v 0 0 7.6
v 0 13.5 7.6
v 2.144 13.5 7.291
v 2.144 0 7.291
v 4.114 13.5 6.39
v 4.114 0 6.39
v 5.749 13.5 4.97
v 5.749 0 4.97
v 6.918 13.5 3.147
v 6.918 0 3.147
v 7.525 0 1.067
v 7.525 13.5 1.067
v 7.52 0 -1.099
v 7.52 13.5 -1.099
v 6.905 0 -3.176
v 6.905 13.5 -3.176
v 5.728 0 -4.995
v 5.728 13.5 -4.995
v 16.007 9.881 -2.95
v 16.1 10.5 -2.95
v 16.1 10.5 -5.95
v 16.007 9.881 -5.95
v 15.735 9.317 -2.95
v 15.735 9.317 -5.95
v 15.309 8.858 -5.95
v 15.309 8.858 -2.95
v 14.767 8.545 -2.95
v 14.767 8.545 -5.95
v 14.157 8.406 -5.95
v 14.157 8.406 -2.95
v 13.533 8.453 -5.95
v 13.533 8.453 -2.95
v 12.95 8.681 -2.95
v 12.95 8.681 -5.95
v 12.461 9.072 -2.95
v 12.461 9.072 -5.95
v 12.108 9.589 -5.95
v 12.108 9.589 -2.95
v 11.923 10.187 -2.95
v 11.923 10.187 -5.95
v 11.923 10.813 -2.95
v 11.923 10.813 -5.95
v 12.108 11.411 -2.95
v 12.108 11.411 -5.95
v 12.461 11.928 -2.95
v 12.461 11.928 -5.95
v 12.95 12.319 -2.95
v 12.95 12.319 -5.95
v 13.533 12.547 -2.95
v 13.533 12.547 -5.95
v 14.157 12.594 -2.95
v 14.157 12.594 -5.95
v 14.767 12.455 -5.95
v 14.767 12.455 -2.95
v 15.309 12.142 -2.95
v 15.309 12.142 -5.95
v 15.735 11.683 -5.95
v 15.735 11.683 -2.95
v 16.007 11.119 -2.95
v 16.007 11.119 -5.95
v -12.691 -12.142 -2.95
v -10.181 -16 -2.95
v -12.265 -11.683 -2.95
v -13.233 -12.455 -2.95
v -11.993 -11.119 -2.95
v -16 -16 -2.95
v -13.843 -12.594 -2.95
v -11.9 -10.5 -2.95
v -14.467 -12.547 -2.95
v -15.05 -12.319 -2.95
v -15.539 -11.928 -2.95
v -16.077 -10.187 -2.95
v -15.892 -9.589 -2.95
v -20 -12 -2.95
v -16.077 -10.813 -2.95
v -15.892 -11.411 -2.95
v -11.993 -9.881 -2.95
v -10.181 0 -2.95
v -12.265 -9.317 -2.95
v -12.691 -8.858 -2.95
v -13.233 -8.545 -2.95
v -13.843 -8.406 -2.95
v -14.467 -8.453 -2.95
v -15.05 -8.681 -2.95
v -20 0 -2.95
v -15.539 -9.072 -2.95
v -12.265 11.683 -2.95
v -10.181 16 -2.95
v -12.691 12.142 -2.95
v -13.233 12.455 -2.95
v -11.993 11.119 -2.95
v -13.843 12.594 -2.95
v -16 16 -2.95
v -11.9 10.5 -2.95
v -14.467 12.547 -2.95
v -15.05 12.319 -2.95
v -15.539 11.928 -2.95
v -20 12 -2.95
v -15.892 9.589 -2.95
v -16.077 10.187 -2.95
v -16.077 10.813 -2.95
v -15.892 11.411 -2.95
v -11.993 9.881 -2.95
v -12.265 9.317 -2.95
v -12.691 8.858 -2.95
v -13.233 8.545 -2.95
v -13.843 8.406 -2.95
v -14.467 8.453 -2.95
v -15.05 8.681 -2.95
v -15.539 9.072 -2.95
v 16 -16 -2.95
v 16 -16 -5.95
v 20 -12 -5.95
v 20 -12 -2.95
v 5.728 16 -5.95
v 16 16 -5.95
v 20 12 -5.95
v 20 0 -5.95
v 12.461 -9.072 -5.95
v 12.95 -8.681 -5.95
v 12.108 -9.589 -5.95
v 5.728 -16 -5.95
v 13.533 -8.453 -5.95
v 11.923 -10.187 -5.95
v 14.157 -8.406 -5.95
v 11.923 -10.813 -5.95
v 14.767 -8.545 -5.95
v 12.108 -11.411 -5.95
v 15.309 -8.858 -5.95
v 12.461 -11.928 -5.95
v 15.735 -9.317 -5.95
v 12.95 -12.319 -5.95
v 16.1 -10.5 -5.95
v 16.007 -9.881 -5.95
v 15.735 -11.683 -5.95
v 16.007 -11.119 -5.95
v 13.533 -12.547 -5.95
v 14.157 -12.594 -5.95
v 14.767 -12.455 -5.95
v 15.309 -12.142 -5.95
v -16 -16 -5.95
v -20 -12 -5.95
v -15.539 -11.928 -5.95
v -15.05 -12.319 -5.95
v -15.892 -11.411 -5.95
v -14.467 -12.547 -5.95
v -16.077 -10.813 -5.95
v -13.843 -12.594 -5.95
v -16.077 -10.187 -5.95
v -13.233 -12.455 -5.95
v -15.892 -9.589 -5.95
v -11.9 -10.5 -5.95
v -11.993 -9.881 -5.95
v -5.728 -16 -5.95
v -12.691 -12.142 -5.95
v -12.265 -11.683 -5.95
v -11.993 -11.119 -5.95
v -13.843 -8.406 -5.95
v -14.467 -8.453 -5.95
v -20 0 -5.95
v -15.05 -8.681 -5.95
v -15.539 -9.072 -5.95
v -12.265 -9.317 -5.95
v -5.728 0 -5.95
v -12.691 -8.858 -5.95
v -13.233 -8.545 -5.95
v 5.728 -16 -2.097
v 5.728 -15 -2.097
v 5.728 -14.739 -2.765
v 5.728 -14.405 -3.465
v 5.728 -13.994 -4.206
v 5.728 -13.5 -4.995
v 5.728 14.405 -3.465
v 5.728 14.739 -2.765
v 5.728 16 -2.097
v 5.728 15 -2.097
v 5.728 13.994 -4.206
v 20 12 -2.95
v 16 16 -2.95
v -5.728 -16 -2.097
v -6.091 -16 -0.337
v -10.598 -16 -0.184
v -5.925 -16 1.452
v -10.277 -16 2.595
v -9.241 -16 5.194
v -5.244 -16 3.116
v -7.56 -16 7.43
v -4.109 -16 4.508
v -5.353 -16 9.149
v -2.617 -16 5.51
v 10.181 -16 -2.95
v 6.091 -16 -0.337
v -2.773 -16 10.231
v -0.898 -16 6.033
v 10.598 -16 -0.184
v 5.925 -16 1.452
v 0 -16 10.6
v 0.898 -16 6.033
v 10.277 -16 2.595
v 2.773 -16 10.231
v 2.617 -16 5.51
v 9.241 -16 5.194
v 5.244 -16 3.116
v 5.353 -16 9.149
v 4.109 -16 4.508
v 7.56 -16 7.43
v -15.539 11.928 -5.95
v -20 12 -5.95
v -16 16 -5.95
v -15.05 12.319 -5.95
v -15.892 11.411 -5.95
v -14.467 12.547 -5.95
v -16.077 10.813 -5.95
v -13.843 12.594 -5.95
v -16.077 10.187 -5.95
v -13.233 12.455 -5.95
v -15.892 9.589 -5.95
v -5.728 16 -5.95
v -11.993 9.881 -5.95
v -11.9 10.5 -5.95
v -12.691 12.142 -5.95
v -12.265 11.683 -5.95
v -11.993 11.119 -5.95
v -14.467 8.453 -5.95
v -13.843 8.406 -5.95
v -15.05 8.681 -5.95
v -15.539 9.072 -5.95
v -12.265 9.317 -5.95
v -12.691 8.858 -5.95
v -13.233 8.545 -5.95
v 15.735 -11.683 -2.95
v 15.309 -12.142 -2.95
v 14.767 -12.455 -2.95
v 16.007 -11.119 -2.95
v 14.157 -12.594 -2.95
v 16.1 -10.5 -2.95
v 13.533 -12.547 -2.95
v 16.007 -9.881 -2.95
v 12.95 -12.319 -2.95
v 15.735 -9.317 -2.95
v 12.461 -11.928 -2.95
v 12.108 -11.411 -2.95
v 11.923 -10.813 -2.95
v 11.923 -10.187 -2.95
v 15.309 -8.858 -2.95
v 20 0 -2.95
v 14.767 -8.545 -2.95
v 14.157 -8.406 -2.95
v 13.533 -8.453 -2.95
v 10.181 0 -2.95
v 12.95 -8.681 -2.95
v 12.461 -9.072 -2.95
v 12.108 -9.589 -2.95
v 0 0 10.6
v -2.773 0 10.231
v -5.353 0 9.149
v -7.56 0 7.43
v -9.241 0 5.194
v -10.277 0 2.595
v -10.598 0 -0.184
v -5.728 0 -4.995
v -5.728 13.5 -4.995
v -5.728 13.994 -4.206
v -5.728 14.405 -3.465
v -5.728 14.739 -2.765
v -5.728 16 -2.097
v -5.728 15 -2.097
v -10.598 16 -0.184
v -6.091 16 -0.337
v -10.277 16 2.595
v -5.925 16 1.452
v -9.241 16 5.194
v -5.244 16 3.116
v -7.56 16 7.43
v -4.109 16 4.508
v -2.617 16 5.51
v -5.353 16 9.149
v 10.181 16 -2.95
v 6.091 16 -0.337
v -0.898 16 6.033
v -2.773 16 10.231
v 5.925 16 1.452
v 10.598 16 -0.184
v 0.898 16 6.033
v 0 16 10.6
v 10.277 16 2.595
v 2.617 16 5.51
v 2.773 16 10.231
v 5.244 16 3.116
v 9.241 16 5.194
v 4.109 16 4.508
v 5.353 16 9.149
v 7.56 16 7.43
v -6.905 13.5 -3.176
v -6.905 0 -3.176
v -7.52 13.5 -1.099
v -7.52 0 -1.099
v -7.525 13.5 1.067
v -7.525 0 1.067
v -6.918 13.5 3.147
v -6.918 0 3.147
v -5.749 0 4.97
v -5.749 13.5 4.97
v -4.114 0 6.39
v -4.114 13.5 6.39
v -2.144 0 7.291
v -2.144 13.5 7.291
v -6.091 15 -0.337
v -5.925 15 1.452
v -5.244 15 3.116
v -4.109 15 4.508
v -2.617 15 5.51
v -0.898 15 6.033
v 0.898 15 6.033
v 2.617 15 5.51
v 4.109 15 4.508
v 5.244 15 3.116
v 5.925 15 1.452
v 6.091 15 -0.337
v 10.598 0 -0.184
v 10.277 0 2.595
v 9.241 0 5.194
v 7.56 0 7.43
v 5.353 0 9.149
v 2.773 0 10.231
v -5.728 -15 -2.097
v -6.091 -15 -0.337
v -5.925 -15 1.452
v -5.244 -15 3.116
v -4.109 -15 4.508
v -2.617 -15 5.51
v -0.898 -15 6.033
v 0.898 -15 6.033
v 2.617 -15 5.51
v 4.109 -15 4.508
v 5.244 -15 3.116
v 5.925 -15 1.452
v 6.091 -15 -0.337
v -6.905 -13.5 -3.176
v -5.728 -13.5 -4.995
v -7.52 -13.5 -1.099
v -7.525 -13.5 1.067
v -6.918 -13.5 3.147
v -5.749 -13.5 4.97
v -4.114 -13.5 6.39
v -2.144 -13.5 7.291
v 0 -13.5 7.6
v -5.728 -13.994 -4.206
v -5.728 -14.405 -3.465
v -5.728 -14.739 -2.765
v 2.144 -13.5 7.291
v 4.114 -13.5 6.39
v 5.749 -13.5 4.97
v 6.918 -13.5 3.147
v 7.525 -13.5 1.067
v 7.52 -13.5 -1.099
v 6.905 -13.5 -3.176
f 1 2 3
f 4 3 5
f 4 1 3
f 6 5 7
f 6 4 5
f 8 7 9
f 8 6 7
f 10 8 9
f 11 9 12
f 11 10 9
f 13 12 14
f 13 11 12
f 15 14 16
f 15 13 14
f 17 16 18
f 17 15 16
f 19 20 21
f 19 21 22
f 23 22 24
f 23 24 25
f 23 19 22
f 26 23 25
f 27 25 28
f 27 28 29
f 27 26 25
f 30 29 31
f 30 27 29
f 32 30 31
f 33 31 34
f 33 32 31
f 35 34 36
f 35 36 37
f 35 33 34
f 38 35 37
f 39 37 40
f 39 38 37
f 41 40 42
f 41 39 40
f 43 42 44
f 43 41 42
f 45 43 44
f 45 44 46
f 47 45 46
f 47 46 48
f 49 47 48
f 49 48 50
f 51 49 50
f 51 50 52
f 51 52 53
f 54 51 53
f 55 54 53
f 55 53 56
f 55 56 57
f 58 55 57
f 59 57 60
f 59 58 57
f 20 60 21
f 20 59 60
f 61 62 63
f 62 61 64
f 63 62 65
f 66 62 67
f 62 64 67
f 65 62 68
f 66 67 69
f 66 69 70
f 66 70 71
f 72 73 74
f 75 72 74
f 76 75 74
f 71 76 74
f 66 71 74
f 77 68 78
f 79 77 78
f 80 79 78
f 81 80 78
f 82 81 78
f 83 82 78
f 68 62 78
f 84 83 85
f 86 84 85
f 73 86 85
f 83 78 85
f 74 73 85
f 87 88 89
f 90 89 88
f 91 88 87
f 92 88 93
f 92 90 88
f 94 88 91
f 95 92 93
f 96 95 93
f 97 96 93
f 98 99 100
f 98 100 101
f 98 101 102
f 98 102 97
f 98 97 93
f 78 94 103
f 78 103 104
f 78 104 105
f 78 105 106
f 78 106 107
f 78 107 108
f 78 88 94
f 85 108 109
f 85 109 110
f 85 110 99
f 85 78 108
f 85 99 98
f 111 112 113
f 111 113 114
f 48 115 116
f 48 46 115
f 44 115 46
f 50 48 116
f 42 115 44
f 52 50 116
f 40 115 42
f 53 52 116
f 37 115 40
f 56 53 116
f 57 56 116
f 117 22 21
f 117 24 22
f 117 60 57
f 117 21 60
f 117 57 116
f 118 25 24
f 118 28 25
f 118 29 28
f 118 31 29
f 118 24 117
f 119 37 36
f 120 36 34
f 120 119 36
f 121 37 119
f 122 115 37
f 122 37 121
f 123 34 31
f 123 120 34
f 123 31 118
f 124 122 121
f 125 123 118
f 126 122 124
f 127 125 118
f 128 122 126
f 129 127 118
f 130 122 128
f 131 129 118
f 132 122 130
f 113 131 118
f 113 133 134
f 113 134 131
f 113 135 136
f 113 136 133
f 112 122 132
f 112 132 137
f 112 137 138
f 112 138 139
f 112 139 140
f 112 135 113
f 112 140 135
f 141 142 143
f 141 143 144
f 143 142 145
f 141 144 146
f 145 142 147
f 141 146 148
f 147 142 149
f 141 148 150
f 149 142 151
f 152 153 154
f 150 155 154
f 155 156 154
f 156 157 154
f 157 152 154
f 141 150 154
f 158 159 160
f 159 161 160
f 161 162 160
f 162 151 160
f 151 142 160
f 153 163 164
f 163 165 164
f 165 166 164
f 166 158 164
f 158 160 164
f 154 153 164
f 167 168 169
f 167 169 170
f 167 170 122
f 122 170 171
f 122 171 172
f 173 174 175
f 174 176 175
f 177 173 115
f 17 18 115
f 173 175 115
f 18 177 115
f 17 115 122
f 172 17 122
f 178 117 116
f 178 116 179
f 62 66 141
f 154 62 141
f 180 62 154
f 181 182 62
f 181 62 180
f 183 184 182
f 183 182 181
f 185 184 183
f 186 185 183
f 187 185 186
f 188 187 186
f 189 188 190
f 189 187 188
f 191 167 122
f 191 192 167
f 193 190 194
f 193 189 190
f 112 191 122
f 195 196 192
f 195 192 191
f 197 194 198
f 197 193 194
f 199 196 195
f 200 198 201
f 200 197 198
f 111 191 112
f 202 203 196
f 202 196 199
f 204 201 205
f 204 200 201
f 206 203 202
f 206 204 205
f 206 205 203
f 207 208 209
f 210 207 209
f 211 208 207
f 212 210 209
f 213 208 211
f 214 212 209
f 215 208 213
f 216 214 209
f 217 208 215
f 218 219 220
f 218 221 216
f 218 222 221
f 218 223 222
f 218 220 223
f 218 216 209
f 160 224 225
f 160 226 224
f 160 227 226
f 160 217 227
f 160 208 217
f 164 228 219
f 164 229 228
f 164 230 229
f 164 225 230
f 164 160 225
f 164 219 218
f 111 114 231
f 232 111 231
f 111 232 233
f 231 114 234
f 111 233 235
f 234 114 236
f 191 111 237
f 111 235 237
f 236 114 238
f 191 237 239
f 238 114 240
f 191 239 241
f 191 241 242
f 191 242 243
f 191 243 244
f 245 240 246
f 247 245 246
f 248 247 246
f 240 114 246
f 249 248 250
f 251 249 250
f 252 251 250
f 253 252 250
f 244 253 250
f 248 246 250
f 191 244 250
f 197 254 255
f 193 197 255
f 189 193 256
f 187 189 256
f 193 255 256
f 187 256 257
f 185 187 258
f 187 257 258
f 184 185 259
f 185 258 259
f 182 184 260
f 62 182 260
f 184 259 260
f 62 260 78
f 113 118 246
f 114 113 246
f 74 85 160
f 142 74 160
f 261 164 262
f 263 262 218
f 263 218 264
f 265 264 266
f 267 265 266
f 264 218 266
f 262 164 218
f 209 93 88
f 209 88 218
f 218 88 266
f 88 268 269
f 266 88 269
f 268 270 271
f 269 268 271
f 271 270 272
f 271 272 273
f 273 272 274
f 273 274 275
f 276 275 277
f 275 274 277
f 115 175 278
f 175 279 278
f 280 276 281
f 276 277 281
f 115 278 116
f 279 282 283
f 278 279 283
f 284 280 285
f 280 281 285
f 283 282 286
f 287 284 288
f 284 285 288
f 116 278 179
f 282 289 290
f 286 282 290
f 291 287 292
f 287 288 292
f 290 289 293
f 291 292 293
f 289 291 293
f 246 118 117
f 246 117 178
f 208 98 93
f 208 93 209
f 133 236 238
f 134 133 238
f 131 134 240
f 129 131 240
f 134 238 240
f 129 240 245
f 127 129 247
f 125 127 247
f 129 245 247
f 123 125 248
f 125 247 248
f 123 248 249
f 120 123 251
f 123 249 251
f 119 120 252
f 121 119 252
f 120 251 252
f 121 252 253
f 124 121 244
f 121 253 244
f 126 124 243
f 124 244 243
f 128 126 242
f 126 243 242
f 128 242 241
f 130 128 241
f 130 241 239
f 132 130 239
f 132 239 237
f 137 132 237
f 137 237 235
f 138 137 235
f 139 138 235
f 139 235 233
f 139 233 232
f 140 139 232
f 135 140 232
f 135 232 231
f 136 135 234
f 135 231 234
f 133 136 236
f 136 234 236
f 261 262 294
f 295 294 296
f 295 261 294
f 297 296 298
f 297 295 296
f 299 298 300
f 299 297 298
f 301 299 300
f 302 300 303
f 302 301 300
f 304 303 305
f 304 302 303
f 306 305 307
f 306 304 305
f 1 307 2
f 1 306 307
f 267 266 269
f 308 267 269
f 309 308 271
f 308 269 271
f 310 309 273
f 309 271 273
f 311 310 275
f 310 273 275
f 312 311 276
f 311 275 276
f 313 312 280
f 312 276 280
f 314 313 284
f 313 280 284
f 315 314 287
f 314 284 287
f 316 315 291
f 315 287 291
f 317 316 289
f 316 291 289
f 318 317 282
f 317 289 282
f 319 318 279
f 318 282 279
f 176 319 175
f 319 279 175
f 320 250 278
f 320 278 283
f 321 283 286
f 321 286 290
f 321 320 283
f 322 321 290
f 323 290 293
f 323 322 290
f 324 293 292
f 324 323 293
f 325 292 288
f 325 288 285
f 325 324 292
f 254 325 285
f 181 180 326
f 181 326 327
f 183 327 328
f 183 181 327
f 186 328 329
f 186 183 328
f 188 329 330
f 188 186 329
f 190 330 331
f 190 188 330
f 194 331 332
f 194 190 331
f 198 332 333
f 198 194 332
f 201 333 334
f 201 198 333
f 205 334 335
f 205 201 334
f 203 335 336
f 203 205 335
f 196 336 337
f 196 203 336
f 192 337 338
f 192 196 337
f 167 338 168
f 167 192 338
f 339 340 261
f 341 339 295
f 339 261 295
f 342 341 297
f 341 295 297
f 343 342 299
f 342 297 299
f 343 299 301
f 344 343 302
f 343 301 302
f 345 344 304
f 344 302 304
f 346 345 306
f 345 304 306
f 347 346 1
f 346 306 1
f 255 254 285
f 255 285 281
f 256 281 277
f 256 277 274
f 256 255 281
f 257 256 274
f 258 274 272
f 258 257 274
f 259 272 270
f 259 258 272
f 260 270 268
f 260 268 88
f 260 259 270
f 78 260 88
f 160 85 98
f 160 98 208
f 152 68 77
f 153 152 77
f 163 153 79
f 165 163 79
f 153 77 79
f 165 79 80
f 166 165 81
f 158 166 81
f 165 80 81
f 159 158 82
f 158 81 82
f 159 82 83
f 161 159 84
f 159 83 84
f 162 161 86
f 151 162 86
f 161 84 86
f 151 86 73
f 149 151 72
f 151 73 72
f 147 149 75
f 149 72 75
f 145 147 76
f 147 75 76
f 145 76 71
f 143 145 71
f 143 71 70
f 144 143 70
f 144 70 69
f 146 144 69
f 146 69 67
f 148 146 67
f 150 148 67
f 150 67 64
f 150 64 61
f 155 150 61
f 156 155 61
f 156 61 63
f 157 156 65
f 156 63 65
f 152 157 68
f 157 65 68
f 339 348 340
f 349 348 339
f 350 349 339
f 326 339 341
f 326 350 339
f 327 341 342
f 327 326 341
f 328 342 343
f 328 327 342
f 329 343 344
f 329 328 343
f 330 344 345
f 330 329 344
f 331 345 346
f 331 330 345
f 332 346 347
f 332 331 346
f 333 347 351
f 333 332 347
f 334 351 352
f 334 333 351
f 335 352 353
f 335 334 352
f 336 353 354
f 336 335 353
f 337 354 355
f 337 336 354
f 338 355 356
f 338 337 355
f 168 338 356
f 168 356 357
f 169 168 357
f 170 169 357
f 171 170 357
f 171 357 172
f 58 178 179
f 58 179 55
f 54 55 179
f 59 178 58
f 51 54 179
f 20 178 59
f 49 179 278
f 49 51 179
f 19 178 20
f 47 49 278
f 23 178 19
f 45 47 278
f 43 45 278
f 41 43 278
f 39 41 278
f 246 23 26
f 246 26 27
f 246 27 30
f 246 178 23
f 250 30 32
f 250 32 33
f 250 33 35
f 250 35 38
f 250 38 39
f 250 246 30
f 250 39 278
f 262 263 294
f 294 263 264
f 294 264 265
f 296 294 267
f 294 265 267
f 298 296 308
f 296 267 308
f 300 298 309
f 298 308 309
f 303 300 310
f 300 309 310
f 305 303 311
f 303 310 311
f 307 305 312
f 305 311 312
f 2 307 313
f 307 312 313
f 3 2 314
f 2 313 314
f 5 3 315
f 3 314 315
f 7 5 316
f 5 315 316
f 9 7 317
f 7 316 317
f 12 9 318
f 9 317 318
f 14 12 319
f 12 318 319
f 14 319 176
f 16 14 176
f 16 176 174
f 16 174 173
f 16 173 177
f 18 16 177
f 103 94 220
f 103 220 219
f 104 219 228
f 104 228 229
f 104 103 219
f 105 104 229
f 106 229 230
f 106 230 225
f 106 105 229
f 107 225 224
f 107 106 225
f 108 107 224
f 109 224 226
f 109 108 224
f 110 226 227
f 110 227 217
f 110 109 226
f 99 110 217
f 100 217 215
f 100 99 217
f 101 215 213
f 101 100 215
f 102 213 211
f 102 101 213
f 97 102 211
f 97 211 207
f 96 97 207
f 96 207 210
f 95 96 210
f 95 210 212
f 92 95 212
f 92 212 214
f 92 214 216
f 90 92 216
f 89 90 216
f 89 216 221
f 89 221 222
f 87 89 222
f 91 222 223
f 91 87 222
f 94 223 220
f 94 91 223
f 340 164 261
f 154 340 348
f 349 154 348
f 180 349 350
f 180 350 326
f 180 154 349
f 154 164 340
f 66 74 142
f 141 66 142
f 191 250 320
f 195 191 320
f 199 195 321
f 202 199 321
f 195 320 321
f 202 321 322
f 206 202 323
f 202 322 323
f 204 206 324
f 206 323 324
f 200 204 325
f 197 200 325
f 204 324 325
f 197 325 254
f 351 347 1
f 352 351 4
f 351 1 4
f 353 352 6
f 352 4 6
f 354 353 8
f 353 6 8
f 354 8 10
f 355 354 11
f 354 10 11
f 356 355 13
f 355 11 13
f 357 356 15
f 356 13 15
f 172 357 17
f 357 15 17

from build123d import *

# Parameters (mm, degrees)
F1_DEPTH = 16
F2_R     = 2.1
F3_DEPTH = 3
F4_SIZE  = 4
F6_DEPTH = 2.5
F7_SIZE  = 1.49999


# Not quite as in the source:
# - a fillet or chamfer is up to 0.001 mm smaller than in the source, because OpenCascade refuses the exact size


with BuildPart() as f1:
    # F0 (on Front) → F1 (new body)
    with BuildSketch(Plane.XZ):
        with BuildLine():
            ThreePointArc((-5.7283718128, -4.9945726919), (-6.9180471398, 3.1465256666), (0, 7.6))
            Line((0, 7.6), (0, 10.6))
            ThreePointArc((0, 10.6), (-8.4743731332, 6.367495583), (-10.1812327348, -2.95))
            Line((-10.1812327348, -2.95), (-20, -2.95))
            Line((-20, -2.95), (-20, -5.95))
            Line((-20, -5.95), (-5.7283718128, -5.95))
            Line((-5.7283718128, -5.95), (-5.7283718128, -4.9945726919))
        make_face()
        with BuildLine():
            Line((0, 10.6), (0, 7.6))
            ThreePointArc((0, 7.6), (6.9180471398, 3.1465256666), (5.7283718128, -4.9945726919))
            Line((5.7283718128, -4.9945726919), (5.7283718128, -5.95))
            Line((5.7283718128, -5.95), (20, -5.95))
            Line((20, -5.95), (20, -2.95))
            Line((20, -2.95), (10.1812327348, -2.95))
            ThreePointArc((10.1812327348, -2.95), (8.4743731332, 6.367495583), (0, 10.6))
        make_face()
    extrude(amount=F1_DEPTH)

    # F2 (on face) → F3 (cut, through all)
    with BuildSketch(Plane.XY.offset(-2.95)):
        with Locations((-14, -10.5)):
            Circle(F2_R)
        with Locations((14, -10.5)):
            Circle(F2_R)
    extrude(amount=-F3_DEPTH, mode=Mode.SUBTRACT)

    # F4
    f4_edges = [f1.edges().sort_by_distance(p)[0] for p in [
        (-20, -16, -4.45),
        (20, -16, -4.45),
    ]]
    chamfer(f4_edges, length=F4_SIZE)

    # F5 (on face) → F6 (join)
    with BuildSketch(Plane.XZ.offset(16)):
        with BuildLine():
            Line((5.7283718128, -2.0966059178), (5.7283718128, -4.9945726919))
            ThreePointArc((5.7283718128, -4.9945726919), (0, 7.6), (-5.7283718128, -4.9945726919))
            Line((-5.7283718128, -4.9945726919), (-5.7283718128, -2.0966059178))
            ThreePointArc((-5.7283718128, -2.0966059178), (0, 6.1), (5.7283718128, -2.0966059178))
        make_face()
    extrude(amount=-F6_DEPTH)

    # F7 (size 1.5 in the source; OpenCascade refuses exactly that, so slightly less here)
    f7_edges = [f1.edges().sort_by_distance(p)[0] for p in [
        (0, -13.5, 6.1),
    ]]
    chamfer(f7_edges, length=F7_SIZE)

    # F8: F1 across plane


with BuildPart() as f1_1:
    add(f1.part)
    add(f1.part.mirror(Plane.XZ))


solid = f1_1.part
